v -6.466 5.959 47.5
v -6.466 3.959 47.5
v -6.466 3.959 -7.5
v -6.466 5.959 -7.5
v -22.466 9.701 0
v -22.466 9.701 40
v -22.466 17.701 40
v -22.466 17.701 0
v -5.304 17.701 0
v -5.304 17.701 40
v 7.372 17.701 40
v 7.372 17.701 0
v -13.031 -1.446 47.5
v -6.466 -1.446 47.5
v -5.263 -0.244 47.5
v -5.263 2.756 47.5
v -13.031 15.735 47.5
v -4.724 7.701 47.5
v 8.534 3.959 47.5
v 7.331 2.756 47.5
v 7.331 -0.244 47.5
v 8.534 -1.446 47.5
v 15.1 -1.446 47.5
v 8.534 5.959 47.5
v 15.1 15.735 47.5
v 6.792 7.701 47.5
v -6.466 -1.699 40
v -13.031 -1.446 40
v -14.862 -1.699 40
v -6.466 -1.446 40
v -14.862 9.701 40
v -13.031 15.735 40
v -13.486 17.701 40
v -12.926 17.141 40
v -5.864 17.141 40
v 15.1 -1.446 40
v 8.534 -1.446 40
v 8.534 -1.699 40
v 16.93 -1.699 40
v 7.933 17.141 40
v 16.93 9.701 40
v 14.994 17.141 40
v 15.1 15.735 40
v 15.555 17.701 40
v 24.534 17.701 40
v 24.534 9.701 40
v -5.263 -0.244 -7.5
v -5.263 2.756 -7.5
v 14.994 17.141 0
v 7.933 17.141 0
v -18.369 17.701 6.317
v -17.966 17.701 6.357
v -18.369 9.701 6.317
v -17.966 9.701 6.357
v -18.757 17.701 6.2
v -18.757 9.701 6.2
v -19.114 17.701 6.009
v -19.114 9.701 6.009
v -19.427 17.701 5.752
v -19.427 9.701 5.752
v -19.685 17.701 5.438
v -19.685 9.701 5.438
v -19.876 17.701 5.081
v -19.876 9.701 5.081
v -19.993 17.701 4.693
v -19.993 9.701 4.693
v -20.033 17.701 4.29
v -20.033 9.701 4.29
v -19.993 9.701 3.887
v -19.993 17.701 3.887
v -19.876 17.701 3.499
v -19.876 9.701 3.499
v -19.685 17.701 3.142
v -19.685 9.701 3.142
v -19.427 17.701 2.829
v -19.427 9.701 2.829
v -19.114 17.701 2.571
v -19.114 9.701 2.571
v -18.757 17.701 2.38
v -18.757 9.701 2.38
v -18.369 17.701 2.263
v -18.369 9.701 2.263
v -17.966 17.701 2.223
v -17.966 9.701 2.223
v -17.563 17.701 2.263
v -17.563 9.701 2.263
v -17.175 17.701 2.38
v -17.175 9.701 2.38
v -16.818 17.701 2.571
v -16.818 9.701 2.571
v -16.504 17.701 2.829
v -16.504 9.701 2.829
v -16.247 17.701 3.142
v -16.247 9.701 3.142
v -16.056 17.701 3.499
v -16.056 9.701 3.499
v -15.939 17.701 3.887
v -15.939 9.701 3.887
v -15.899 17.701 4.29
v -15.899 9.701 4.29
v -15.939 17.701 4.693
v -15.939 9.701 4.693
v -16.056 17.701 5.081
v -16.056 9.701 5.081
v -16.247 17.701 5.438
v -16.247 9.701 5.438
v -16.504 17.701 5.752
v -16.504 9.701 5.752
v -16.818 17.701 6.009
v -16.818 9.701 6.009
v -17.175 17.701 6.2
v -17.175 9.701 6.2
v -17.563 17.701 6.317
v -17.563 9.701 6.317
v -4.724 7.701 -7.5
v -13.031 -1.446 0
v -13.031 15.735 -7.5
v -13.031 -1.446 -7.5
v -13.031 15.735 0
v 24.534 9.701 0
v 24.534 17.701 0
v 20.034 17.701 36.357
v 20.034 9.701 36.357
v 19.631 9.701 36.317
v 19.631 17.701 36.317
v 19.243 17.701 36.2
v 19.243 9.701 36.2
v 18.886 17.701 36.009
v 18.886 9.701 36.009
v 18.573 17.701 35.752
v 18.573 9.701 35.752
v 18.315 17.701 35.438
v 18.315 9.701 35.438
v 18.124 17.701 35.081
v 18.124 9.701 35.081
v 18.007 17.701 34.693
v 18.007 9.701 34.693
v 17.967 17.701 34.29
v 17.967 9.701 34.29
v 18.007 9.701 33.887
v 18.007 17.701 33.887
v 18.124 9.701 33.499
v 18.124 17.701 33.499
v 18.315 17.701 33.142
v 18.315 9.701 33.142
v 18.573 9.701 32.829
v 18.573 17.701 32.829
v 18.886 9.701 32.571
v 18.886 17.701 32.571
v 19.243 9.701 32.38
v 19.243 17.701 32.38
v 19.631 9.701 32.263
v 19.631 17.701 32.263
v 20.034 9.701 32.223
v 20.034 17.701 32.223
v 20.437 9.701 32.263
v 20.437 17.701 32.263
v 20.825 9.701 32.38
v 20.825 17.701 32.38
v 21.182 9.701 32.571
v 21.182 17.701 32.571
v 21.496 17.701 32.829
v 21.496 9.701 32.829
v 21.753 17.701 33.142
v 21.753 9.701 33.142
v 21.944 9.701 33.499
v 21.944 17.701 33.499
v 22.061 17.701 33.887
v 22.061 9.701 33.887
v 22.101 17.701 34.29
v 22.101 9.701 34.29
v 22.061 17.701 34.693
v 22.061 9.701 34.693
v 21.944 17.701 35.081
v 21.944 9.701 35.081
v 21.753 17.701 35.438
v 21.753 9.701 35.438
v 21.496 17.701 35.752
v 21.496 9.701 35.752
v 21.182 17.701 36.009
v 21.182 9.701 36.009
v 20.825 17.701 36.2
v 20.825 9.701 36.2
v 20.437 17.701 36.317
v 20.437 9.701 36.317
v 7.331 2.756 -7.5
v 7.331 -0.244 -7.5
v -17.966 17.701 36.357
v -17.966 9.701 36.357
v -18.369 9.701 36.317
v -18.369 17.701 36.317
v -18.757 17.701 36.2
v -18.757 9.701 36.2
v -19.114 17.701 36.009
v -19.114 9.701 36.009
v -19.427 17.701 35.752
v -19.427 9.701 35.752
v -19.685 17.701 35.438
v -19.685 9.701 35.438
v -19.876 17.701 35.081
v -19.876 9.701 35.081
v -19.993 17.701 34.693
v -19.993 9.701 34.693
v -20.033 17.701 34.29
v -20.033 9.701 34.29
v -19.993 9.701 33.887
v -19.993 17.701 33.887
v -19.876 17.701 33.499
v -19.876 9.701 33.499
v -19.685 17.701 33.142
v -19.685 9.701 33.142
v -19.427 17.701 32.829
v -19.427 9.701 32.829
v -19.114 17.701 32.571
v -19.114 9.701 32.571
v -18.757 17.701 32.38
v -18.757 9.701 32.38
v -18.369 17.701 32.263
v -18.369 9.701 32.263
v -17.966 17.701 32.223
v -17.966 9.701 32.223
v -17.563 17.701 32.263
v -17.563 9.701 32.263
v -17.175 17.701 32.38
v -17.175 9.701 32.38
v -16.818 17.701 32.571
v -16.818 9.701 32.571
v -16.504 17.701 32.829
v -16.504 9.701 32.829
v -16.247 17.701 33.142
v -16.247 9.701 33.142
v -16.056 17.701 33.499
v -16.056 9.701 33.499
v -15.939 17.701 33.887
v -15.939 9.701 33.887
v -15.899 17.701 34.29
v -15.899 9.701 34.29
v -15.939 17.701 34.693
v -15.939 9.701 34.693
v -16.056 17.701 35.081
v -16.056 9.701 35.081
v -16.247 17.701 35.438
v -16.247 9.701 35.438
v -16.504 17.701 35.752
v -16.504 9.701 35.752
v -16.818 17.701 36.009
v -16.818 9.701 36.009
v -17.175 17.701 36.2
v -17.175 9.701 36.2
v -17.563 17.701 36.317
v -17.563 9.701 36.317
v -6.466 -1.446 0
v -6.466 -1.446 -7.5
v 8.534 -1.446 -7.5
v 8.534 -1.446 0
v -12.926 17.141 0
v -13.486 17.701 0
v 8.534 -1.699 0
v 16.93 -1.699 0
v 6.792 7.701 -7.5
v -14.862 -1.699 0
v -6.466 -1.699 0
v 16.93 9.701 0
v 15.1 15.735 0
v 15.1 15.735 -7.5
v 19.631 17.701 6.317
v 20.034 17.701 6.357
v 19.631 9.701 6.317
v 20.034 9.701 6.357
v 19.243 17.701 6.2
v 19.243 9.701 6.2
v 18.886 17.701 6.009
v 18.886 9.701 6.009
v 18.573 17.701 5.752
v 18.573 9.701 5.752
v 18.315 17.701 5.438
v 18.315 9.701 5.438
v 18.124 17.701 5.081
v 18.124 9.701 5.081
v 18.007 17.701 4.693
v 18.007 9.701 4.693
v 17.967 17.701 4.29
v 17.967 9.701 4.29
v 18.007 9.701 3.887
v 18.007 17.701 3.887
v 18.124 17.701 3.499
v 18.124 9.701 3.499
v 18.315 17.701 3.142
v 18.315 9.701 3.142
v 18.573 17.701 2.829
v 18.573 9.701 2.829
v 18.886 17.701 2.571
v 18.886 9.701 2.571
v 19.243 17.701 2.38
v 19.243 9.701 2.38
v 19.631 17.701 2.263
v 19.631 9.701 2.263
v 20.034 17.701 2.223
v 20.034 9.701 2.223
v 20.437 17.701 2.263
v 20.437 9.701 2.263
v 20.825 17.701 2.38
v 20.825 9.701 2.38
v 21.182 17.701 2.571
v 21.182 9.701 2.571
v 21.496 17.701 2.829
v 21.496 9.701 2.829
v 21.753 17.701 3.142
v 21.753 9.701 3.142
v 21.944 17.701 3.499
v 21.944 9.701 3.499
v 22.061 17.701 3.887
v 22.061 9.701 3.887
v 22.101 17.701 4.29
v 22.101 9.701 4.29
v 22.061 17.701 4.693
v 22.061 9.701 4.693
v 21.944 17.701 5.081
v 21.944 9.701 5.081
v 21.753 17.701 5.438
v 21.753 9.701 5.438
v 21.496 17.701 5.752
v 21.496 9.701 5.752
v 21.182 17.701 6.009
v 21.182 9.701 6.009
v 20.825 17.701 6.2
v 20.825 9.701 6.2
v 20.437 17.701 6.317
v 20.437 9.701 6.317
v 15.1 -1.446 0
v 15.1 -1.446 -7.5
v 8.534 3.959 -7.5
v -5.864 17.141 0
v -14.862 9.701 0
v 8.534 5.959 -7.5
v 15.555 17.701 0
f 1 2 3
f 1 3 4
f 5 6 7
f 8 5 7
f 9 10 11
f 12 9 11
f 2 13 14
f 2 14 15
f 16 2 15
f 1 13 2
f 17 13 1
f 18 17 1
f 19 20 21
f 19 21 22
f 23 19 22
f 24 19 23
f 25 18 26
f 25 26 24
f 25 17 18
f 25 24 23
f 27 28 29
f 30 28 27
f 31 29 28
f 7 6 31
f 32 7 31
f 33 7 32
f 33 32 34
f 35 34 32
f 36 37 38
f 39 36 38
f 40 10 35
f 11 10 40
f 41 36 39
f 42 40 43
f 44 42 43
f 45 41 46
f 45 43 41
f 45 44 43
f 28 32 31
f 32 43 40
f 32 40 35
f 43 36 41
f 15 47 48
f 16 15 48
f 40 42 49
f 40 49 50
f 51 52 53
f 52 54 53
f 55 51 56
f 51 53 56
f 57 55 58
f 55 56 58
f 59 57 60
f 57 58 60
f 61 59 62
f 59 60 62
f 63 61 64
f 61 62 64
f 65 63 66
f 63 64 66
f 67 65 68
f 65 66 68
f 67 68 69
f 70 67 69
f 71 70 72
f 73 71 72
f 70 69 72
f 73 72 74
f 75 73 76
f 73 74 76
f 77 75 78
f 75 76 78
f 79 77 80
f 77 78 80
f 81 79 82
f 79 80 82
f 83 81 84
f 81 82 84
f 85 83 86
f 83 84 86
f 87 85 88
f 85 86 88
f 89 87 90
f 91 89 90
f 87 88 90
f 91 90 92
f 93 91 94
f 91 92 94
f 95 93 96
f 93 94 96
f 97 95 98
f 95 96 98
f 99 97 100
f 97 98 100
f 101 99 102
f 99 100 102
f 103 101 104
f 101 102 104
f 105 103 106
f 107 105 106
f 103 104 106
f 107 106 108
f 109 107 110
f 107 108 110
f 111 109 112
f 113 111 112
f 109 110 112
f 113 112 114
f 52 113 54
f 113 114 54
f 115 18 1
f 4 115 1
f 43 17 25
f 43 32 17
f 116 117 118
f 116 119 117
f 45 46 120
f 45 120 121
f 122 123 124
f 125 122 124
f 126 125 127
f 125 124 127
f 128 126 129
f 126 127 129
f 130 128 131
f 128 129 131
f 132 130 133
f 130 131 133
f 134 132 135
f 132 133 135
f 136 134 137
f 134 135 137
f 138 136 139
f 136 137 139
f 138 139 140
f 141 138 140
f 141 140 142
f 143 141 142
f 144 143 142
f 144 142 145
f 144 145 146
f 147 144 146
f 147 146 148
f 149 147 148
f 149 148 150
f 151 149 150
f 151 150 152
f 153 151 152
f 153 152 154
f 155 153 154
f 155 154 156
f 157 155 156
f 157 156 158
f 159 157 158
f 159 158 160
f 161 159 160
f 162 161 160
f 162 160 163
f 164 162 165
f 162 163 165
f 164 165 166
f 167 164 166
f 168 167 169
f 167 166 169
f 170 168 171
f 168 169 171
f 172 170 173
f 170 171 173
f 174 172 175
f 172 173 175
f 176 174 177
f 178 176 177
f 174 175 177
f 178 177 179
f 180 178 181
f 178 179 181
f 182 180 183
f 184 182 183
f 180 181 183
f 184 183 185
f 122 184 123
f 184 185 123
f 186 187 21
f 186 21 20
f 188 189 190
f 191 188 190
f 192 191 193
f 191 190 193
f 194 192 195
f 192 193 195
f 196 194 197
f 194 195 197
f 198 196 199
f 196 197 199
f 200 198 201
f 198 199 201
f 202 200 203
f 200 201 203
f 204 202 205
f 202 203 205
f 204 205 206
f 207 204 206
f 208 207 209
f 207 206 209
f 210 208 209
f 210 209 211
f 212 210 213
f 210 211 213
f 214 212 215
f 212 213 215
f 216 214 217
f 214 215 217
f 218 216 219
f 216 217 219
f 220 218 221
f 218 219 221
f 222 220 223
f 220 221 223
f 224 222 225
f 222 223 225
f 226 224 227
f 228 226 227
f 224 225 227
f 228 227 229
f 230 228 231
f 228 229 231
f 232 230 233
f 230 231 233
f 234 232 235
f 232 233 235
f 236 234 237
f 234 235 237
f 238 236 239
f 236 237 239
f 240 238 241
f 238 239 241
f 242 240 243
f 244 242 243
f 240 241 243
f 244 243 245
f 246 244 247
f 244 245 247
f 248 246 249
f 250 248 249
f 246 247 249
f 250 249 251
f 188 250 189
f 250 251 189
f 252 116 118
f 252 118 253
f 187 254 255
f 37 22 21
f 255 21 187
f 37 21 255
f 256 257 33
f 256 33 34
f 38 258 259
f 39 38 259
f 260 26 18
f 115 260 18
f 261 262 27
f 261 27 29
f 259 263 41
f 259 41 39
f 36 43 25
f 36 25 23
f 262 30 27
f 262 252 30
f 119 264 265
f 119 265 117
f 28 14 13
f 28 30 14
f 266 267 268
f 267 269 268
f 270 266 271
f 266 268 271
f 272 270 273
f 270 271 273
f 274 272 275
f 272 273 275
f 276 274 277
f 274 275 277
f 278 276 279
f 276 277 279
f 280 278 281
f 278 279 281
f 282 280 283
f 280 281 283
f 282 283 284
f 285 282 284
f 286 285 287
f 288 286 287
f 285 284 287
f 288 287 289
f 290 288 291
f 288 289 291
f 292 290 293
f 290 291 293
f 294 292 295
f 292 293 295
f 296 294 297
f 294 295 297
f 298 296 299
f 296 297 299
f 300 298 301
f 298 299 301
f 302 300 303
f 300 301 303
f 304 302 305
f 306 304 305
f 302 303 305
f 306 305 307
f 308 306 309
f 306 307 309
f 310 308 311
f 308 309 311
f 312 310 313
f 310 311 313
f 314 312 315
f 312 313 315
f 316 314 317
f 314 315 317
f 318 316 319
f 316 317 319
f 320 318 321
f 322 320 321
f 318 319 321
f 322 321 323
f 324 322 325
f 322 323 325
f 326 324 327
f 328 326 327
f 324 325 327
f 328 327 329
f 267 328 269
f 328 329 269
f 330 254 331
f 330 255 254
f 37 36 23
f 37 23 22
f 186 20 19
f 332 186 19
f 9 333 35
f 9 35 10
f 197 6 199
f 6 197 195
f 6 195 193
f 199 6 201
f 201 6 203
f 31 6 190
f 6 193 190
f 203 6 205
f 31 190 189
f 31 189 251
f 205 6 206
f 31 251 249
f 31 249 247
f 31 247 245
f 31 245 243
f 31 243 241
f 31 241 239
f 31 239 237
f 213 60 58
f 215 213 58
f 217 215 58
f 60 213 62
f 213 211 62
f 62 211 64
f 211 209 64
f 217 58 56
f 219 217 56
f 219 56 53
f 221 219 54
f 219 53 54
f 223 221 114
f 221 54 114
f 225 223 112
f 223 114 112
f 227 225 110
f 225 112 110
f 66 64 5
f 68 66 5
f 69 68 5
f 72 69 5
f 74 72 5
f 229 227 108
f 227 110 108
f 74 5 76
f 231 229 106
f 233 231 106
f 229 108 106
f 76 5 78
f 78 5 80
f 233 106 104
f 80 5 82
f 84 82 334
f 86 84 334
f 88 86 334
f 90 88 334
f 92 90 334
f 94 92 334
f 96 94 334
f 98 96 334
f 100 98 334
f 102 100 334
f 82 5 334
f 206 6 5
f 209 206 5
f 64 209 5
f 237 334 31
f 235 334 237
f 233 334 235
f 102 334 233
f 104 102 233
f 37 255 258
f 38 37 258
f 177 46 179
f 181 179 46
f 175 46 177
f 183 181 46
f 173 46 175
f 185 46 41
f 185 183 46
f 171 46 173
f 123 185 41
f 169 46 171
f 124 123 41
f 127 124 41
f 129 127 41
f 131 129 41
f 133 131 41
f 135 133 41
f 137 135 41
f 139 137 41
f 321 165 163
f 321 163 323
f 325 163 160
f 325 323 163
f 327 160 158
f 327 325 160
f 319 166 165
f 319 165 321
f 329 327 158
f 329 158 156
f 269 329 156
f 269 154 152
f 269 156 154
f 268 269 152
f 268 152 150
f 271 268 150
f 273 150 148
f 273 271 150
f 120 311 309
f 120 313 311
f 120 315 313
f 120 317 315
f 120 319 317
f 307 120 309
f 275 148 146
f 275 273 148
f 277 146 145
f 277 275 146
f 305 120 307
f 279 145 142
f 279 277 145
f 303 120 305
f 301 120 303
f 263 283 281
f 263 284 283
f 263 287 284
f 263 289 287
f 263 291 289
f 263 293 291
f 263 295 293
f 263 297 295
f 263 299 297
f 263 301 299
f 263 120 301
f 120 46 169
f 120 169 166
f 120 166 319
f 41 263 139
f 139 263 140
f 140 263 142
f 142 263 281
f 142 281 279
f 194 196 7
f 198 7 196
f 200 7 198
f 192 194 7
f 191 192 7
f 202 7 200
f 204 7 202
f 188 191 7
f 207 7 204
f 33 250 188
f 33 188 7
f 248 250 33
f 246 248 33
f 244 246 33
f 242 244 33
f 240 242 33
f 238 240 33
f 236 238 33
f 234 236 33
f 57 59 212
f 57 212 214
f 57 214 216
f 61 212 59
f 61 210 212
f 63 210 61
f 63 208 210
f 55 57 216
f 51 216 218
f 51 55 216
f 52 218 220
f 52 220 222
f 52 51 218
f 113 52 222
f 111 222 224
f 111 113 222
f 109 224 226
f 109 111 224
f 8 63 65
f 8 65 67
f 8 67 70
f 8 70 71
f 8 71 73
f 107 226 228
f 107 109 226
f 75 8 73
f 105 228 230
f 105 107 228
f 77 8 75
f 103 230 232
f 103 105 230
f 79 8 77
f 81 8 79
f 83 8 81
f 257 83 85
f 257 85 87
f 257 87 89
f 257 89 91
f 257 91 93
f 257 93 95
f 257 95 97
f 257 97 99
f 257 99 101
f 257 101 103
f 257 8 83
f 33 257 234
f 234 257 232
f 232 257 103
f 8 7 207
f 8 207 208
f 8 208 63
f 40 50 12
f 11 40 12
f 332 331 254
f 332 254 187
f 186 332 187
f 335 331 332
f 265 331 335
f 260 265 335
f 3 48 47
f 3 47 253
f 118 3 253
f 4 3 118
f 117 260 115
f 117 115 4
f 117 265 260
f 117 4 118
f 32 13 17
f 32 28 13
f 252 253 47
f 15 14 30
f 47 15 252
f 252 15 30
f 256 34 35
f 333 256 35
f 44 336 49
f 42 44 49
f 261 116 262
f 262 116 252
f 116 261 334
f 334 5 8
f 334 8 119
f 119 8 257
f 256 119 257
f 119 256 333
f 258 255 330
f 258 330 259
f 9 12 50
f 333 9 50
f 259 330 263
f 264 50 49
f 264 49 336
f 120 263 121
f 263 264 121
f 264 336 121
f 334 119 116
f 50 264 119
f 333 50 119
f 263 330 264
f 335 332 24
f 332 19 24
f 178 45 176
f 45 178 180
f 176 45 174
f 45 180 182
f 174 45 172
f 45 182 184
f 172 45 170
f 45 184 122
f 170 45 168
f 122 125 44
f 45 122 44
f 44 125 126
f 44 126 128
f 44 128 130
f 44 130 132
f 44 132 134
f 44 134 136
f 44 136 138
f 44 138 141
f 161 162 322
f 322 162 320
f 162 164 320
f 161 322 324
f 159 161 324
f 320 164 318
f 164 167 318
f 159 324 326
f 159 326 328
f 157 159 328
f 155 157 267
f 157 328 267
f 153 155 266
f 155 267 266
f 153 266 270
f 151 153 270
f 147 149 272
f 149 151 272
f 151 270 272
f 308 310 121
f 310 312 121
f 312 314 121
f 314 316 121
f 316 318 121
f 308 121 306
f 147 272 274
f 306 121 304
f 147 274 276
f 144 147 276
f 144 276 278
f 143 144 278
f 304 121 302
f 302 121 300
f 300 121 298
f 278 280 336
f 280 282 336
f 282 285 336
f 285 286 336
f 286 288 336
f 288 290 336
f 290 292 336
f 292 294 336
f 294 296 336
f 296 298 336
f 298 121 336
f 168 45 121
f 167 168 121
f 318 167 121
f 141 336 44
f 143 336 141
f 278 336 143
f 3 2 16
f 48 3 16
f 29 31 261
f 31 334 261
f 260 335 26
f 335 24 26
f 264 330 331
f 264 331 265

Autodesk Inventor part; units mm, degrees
ref_plane "YZ Plane" through (0, 0, 0) normal (1, 0, 0) x (0, 1, 0)
ref_plane "XZ Plane" through (0, 0, 0) normal (0, 1, 0) x (-1, 0, 0)
ref_plane "XY Plane" through (0, 0, 0) normal (0, 0, 1) x (1, 0, 0)
sketch "Esboço1" plane through (0, 0, 0) normal (0, 0, 1) x (1, 0, 0)
  line L0 (1.0341, 28.7122) -> (1.0341, -32.1101) construction
  line L1 (1.0341, 7.7011) -> (-4.7241, 7.7011)
  line L2 (-4.7241, 7.7011) -> (-6.4659, 5.9592)
  line L3 (-6.4659, 5.9592) -> (-6.4659, 3.9592)
  line L4 (-6.4659, 3.9592) -> (-5.2631, 2.7564)
  line L5 (-5.2631, 2.7564) -> (-5.2631, -0.2436)
  line L6 (-5.2631, -0.2436) -> (-6.4659, -1.4465)
  line L7 (-6.4659, -1.4465) -> (-6.4659, -1.6989)
  line L8 (-6.4659, -6.2989) -> (1.0341, -6.2989) construction
  line L9 (-22.4659, 9.7011) -> (-22.4659, 17.7011)
  line L10 (-17.9659, 24.9392) -> (-17.9659, -12.707) construction
  line L11 (-20.4659, 24.9392) -> (-20.4659, -12.707) construction
  line L12 (-15.4659, 24.9392) -> (-15.4659, -12.9196) construction
  line L13 (1.0341, 9.7011) -> (-29.6062, 9.7011) construction
  line L14 (-22.4659, 9.7011) -> (-14.8619, 9.7011)
  line L15 (-14.8619, 9.7011) -> (-14.8619, -1.6989)
  line L16 (1.0341, 16.4633) -> (-13.4863, 16.4633) construction
  line L17 (-13.4863, 16.4633) -> (-13.4863, -1.6989) construction
  arc A0 (-14.8619, -1.6989) -> (-22.4659, 9.7011) centre (-28.6186, -2.6389) ccw construction
  line L18 (-6.4659, -1.6989) -> (-6.4659, -6.2989) construction
  line L19 (-6.4659, -1.6989) -> (-14.8619, -1.6989)
  line L20 (-13.4863, 17.7011) -> (-12.9262, 17.1409)
  line L21 (-12.9262, 17.1409) -> (-5.8645, 17.1409)
  line L22 (-5.8645, 17.1409) -> (-5.3043, 17.7011)
  line L23 (-22.4659, 17.7011) -> (-13.4863, 17.7011)
  line L24 (-5.3043, 17.7011) -> (1.0341, 17.7011)
  line L25 (1.0341, 7.7011) -> (6.7923, 7.7011)
  line L26 (6.7923, 7.7011) -> (8.5341, 5.9592)
  line L27 (8.5341, 5.9592) -> (8.5341, 3.9592)
  line L28 (8.5341, 3.9592) -> (7.3313, 2.7564)
  line L29 (7.3313, 2.7564) -> (7.3313, -0.2436)
  line L30 (7.3313, -0.2436) -> (8.5341, -1.4465)
  line L31 (8.5341, -1.4465) -> (8.5341, -1.6989)
  line L32 (8.5341, -6.2989) -> (1.0341, -6.2989) construction
  line L33 (24.5341, 9.7011) -> (24.5341, 17.7011)
  line L34 (20.0341, 24.9392) -> (20.0341, -12.707) construction
  line L35 (22.5341, 24.9392) -> (22.5341, -12.707) construction
  line L36 (17.5341, 24.9392) -> (17.5341, -12.9196) construction
  line L37 (1.0341, 9.7011) -> (31.6744, 9.7011) construction
  line L38 (24.5341, 9.7011) -> (16.9301, 9.7011)
  line L39 (16.9301, 9.7011) -> (16.9301, -1.6989)
  line L40 (1.0341, 16.4633) -> (15.5546, 16.4633) construction
  line L41 (15.5546, 16.4633) -> (15.5546, -1.6989) construction
  arc A1 (24.5341, 9.7011) -> (16.9301, -1.6989) centre (30.6868, -2.6389) ccw construction
  line L42 (8.5341, -1.6989) -> (8.5341, -6.2989) construction
  line L43 (8.5341, -1.6989) -> (16.9301, -1.6989)
  line L44 (15.5546, 17.7011) -> (14.9944, 17.1409)
  line L45 (14.9944, 17.1409) -> (7.9327, 17.1409)
  line L46 (7.9327, 17.1409) -> (7.3725, 17.7011)
  line L47 (24.5341, 17.7011) -> (15.5546, 17.7011)
  line L48 (7.3725, 17.7011) -> (1.0341, 17.7011)
  dimension "d11" = 45
  dimension "d12" = 3
  dimension "d13" = 14
  dimension "d14" = 2
  dimension "d15" = 7.5
  dimension "d19" = 23.5
  dimension "d21" = 2.5
  dimension "d22" = 2.5
  dimension "d23" = 19
extrude "Extrusão2" add sketch "Esboço1" along normal blind 40
sketch "Esboço2" plane through (0, 0, 40) normal (0, 0, 1) x (1, 0, 0)
  line L0 (-13.0314, -1.4465) -> (-13.0314, 15.7348)
  line L1 (-13.0314, 15.7348) -> (15.0996, 15.7348)
  line L2 (15.0996, 15.7348) -> (15.0996, -1.4465)
  line L3 (-6.4659, -1.4465) -> (-5.2631, -0.2436) projected
  line L4 (-6.4659, -1.4465) -> (-5.2631, -0.2436)
  line L5 (-5.2631, 2.7564) -> (-6.4659, 3.9592) projected
  line L6 (-5.2631, -0.2436) -> (-5.2631, 2.7564)
  line L7 (-5.2631, 2.7564) -> (-6.4659, 3.9592)
  line L8 (-6.4659, 3.9592) -> (-6.4659, 5.9592) projected
  line L9 (-6.4659, 3.9592) -> (-6.4659, 5.9592)
  line L10 (-6.4659, 5.9592) -> (-4.7241, 7.7011) projected
  line L11 (-6.4659, 5.9592) -> (-4.7241, 7.7011)
  line L12 (-4.7241, 7.7011) -> (6.7923, 7.7011) projected
  line L13 (-4.7241, 7.7011) -> (6.7923, 7.7011)
  line L14 (6.7923, 7.7011) -> (8.5341, 5.9592) projected
  line L15 (6.7923, 7.7011) -> (8.5341, 5.9592)
  line L16 (8.5341, 3.9592) -> (8.5341, 5.9592) projected
  line L17 (8.5341, 5.9592) -> (8.5341, 3.9592)
  line L18 (7.3313, -0.2436) -> (7.3313, 2.7564) projected
  line L19 (8.5341, 3.9592) -> (7.3313, 2.7564)
  line L20 (7.3313, 2.7564) -> (7.3313, -0.2436)
  line L21 (8.5341, -1.4465) -> (7.3313, -0.2436) projected
  line L22 (7.3313, -0.2436) -> (8.5341, -1.4465)
  line L23 (15.0996, -1.4465) -> (8.5341, -1.4465)
  line L24 (-6.4659, -1.4465) -> (-13.0314, -1.4465)
extrude "Extrusão3" add sketch "Esboço2" along normal blind 7.5
sketch "Esboço3" plane through (0, 0, 0) normal (0, 0, -1) x (-1, 0, 0)
  line L0 (-15.0996, -1.4465) -> (-15.0996, 15.7348)
  line L1 (-15.0996, 15.7348) -> (13.0314, 15.7348)
  line L2 (13.0314, 15.7348) -> (13.0314, -1.4465)
  line L3 (-8.5341, -1.4465) -> (-7.3313, -0.2436)
  line L4 (-8.5341, -1.4465) -> (-7.3313, -0.2436)
  line L5 (-7.3313, 2.7564) -> (-8.5341, 3.9592)
  line L6 (-7.3313, -0.2436) -> (-7.3313, 2.7564)
  line L7 (-7.3313, 2.7564) -> (-8.5341, 3.9592)
  line L8 (-8.5341, 3.9592) -> (-8.5341, 5.9592)
  line L9 (-8.5341, 3.9592) -> (-8.5341, 5.9592)
  line L10 (-8.5341, 5.9592) -> (-6.7923, 7.7011)
  line L11 (-8.5341, 5.9592) -> (-6.7923, 7.7011)
  line L12 (-6.7923, 7.7011) -> (4.7241, 7.7011)
  line L13 (-6.7923, 7.7011) -> (4.7241, 7.7011)
  line L14 (4.7241, 7.7011) -> (6.4659, 5.9592)
  line L15 (4.7241, 7.7011) -> (6.4659, 5.9592)
  line L16 (6.4659, 3.9592) -> (6.4659, 5.9592)
  line L17 (6.4659, 5.9592) -> (6.4659, 3.9592)
  line L18 (5.2631, -0.2436) -> (5.2631, 2.7564)
  line L19 (6.4659, 3.9592) -> (5.2631, 2.7564)
  line L20 (5.2631, 2.7564) -> (5.2631, -0.2436)
  line L21 (6.4659, -1.4465) -> (5.2631, -0.2436)
  line L22 (5.2631, -0.2436) -> (6.4659, -1.4465)
  line L23 (13.0314, -1.4465) -> (6.4659, -1.4465)
  line L24 (-8.5341, -1.4465) -> (-15.0996, -1.4465)
  point P0 (0, 0)
  point P1 (-1.0341, 15.7348)
extrude "Extrusão4" add sketch "Esboço3" along normal blind 7.5
sketch "Esboço4" plane through (-5.3043, 17.7011, 0) normal (0, 1, 0) x (1, 0, 0)
  line L0 (6.3384, -52.3357) -> (6.3384, 13.624) construction
  line L1 (-22.2826, -19.2901) -> (34.758, -19.2901) construction
  circle A0 centre (-12.6616, -34.2901) radius 1 construction
  circle A1 centre (-12.6616, -4.2901) radius 1 construction
  circle A2 centre (25.3384, -34.2901) radius 1 construction
  circle A3 centre (25.3384, -4.2901) radius 1 construction
  dimension "d31" = 2
  dimension "d32" = 2
  dimension "d33" = 2
  dimension "d34" = 2
  dimension "d35" = 19
  dimension "d36" = 19
  dimension "d37" = 19
  dimension "d38" = 19
  dimension "d39" = 15
  dimension "d40" = 15
  dimension "d41" = 15
  dimension "d42" = 15
hole "Furo1" at (-17.9659, 17.7011, 4.2901) at (-17.9659, 17.7011, 34.2901) at (20.0341, 17.7011, 34.2901) at (20.0341, 17.7011, 4.2901) direction (0, -1, 0) diameter 4.134 end through all thread size "M5x0.8" class "6H" standard "ANSI Metric M Profile"
equation "\"d22\" = d21"
equation "\"d36\" = d35"
equation "\"d37\" = d35"
equation "\"d38\" = d35"
equation "\"d40\" = d39"
equation "\"d41\" = d39"
equation "\"d42\" = d39"
properties part number "PATINS TRILHO LINEAR 15MM DFH-A_AL"
